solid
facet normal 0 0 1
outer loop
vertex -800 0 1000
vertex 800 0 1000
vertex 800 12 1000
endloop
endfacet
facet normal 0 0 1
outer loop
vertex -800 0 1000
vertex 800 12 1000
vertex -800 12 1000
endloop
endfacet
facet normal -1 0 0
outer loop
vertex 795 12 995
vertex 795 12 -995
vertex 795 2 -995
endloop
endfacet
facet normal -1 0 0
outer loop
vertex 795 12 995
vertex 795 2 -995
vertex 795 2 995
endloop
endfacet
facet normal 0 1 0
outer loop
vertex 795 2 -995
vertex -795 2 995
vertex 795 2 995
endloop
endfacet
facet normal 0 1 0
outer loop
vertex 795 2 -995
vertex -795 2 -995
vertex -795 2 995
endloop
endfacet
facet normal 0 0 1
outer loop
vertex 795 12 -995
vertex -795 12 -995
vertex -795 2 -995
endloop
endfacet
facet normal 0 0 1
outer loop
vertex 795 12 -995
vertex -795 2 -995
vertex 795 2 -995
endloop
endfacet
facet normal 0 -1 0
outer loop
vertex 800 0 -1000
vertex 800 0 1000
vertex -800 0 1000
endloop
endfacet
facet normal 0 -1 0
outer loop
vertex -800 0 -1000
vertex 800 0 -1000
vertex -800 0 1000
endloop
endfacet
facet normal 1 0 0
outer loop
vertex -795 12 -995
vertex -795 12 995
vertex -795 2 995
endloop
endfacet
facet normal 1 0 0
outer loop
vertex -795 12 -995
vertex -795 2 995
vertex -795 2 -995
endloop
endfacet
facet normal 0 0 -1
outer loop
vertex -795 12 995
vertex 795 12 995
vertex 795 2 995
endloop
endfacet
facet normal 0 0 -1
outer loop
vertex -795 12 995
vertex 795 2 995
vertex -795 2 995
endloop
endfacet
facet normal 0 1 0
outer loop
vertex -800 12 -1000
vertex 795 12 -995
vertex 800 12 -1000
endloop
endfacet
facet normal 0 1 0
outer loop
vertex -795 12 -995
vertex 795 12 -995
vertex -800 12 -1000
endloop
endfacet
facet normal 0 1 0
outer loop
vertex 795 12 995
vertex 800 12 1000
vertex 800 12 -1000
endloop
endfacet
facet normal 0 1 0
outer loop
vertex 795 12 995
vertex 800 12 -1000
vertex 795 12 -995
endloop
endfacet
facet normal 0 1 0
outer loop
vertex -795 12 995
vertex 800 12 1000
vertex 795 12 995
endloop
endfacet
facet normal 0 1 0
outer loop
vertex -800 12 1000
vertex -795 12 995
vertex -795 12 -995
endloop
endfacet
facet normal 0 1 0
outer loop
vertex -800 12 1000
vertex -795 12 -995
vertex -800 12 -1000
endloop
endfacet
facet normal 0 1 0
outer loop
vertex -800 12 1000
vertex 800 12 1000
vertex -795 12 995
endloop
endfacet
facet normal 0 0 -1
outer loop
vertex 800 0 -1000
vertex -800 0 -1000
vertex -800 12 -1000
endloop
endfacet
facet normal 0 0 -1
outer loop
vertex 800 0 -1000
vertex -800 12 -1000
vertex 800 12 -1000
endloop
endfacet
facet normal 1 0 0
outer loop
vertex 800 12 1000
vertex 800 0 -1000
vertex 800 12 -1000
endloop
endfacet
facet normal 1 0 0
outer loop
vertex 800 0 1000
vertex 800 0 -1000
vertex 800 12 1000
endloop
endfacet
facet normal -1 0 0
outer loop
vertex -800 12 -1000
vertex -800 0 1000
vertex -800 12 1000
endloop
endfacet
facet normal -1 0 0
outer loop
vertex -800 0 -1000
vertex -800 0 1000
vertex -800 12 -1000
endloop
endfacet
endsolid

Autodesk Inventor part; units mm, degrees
ref_plane "YZ Plane" through (0, 0, 0) normal (1, 0, 0) x (0, 1, 0)
ref_plane "XZ Plane" through (0, 0, 0) normal (0, 1, 0) x (-1, 0, 0)
ref_plane "XY Plane" through (0, 0, 0) normal (0, 0, 1) x (1, 0, 0)
sketch "Sketch1" plane through (0, 0, 0) normal (0, 1, 0) x (-1, 0, 0)
  line L0 (-800, 1000) -> (800, 1000)
  line L1 (800, 1000) -> (800, -1000)
  line L2 (800, -1000) -> (-800, -1000)
  line L3 (-800, -1000) -> (-800, 1000)
  line L4 (-800, 1000) -> (800, -1000) construction
  line L5 (800, 1000) -> (-800, -1000) construction
  point P0 (0, 0)
  dimension "d0" = 2000
  dimension "d1" = 1600
extrude "Extrusion1" add sketch "Sketch1" along normal blind 12
sketch "Sketch2" plane through (0, 12, 0) normal (0, 1, 0) x (1, 0, 0)
  line L0 (-800, 1000) -> (-800, -1000) construction
  line L1 (-800, -1000) -> (800, -1000) construction
  line L2 (800, -1000) -> (800, 1000) construction
  line L3 (800, 1000) -> (-800, 1000) construction
  line L4 (-795, -995) -> (-795, 995)
  line L5 (-795, 995) -> (795, 995)
  line L6 (795, 995) -> (795, -995)
  line L7 (795, -995) -> (-795, -995)
  point P0 (0, 0)
  dimension "d4" = 5
extrude "Extrusion2" cut sketch "Sketch2" against normal blind 10
properties part number "stol_1"
